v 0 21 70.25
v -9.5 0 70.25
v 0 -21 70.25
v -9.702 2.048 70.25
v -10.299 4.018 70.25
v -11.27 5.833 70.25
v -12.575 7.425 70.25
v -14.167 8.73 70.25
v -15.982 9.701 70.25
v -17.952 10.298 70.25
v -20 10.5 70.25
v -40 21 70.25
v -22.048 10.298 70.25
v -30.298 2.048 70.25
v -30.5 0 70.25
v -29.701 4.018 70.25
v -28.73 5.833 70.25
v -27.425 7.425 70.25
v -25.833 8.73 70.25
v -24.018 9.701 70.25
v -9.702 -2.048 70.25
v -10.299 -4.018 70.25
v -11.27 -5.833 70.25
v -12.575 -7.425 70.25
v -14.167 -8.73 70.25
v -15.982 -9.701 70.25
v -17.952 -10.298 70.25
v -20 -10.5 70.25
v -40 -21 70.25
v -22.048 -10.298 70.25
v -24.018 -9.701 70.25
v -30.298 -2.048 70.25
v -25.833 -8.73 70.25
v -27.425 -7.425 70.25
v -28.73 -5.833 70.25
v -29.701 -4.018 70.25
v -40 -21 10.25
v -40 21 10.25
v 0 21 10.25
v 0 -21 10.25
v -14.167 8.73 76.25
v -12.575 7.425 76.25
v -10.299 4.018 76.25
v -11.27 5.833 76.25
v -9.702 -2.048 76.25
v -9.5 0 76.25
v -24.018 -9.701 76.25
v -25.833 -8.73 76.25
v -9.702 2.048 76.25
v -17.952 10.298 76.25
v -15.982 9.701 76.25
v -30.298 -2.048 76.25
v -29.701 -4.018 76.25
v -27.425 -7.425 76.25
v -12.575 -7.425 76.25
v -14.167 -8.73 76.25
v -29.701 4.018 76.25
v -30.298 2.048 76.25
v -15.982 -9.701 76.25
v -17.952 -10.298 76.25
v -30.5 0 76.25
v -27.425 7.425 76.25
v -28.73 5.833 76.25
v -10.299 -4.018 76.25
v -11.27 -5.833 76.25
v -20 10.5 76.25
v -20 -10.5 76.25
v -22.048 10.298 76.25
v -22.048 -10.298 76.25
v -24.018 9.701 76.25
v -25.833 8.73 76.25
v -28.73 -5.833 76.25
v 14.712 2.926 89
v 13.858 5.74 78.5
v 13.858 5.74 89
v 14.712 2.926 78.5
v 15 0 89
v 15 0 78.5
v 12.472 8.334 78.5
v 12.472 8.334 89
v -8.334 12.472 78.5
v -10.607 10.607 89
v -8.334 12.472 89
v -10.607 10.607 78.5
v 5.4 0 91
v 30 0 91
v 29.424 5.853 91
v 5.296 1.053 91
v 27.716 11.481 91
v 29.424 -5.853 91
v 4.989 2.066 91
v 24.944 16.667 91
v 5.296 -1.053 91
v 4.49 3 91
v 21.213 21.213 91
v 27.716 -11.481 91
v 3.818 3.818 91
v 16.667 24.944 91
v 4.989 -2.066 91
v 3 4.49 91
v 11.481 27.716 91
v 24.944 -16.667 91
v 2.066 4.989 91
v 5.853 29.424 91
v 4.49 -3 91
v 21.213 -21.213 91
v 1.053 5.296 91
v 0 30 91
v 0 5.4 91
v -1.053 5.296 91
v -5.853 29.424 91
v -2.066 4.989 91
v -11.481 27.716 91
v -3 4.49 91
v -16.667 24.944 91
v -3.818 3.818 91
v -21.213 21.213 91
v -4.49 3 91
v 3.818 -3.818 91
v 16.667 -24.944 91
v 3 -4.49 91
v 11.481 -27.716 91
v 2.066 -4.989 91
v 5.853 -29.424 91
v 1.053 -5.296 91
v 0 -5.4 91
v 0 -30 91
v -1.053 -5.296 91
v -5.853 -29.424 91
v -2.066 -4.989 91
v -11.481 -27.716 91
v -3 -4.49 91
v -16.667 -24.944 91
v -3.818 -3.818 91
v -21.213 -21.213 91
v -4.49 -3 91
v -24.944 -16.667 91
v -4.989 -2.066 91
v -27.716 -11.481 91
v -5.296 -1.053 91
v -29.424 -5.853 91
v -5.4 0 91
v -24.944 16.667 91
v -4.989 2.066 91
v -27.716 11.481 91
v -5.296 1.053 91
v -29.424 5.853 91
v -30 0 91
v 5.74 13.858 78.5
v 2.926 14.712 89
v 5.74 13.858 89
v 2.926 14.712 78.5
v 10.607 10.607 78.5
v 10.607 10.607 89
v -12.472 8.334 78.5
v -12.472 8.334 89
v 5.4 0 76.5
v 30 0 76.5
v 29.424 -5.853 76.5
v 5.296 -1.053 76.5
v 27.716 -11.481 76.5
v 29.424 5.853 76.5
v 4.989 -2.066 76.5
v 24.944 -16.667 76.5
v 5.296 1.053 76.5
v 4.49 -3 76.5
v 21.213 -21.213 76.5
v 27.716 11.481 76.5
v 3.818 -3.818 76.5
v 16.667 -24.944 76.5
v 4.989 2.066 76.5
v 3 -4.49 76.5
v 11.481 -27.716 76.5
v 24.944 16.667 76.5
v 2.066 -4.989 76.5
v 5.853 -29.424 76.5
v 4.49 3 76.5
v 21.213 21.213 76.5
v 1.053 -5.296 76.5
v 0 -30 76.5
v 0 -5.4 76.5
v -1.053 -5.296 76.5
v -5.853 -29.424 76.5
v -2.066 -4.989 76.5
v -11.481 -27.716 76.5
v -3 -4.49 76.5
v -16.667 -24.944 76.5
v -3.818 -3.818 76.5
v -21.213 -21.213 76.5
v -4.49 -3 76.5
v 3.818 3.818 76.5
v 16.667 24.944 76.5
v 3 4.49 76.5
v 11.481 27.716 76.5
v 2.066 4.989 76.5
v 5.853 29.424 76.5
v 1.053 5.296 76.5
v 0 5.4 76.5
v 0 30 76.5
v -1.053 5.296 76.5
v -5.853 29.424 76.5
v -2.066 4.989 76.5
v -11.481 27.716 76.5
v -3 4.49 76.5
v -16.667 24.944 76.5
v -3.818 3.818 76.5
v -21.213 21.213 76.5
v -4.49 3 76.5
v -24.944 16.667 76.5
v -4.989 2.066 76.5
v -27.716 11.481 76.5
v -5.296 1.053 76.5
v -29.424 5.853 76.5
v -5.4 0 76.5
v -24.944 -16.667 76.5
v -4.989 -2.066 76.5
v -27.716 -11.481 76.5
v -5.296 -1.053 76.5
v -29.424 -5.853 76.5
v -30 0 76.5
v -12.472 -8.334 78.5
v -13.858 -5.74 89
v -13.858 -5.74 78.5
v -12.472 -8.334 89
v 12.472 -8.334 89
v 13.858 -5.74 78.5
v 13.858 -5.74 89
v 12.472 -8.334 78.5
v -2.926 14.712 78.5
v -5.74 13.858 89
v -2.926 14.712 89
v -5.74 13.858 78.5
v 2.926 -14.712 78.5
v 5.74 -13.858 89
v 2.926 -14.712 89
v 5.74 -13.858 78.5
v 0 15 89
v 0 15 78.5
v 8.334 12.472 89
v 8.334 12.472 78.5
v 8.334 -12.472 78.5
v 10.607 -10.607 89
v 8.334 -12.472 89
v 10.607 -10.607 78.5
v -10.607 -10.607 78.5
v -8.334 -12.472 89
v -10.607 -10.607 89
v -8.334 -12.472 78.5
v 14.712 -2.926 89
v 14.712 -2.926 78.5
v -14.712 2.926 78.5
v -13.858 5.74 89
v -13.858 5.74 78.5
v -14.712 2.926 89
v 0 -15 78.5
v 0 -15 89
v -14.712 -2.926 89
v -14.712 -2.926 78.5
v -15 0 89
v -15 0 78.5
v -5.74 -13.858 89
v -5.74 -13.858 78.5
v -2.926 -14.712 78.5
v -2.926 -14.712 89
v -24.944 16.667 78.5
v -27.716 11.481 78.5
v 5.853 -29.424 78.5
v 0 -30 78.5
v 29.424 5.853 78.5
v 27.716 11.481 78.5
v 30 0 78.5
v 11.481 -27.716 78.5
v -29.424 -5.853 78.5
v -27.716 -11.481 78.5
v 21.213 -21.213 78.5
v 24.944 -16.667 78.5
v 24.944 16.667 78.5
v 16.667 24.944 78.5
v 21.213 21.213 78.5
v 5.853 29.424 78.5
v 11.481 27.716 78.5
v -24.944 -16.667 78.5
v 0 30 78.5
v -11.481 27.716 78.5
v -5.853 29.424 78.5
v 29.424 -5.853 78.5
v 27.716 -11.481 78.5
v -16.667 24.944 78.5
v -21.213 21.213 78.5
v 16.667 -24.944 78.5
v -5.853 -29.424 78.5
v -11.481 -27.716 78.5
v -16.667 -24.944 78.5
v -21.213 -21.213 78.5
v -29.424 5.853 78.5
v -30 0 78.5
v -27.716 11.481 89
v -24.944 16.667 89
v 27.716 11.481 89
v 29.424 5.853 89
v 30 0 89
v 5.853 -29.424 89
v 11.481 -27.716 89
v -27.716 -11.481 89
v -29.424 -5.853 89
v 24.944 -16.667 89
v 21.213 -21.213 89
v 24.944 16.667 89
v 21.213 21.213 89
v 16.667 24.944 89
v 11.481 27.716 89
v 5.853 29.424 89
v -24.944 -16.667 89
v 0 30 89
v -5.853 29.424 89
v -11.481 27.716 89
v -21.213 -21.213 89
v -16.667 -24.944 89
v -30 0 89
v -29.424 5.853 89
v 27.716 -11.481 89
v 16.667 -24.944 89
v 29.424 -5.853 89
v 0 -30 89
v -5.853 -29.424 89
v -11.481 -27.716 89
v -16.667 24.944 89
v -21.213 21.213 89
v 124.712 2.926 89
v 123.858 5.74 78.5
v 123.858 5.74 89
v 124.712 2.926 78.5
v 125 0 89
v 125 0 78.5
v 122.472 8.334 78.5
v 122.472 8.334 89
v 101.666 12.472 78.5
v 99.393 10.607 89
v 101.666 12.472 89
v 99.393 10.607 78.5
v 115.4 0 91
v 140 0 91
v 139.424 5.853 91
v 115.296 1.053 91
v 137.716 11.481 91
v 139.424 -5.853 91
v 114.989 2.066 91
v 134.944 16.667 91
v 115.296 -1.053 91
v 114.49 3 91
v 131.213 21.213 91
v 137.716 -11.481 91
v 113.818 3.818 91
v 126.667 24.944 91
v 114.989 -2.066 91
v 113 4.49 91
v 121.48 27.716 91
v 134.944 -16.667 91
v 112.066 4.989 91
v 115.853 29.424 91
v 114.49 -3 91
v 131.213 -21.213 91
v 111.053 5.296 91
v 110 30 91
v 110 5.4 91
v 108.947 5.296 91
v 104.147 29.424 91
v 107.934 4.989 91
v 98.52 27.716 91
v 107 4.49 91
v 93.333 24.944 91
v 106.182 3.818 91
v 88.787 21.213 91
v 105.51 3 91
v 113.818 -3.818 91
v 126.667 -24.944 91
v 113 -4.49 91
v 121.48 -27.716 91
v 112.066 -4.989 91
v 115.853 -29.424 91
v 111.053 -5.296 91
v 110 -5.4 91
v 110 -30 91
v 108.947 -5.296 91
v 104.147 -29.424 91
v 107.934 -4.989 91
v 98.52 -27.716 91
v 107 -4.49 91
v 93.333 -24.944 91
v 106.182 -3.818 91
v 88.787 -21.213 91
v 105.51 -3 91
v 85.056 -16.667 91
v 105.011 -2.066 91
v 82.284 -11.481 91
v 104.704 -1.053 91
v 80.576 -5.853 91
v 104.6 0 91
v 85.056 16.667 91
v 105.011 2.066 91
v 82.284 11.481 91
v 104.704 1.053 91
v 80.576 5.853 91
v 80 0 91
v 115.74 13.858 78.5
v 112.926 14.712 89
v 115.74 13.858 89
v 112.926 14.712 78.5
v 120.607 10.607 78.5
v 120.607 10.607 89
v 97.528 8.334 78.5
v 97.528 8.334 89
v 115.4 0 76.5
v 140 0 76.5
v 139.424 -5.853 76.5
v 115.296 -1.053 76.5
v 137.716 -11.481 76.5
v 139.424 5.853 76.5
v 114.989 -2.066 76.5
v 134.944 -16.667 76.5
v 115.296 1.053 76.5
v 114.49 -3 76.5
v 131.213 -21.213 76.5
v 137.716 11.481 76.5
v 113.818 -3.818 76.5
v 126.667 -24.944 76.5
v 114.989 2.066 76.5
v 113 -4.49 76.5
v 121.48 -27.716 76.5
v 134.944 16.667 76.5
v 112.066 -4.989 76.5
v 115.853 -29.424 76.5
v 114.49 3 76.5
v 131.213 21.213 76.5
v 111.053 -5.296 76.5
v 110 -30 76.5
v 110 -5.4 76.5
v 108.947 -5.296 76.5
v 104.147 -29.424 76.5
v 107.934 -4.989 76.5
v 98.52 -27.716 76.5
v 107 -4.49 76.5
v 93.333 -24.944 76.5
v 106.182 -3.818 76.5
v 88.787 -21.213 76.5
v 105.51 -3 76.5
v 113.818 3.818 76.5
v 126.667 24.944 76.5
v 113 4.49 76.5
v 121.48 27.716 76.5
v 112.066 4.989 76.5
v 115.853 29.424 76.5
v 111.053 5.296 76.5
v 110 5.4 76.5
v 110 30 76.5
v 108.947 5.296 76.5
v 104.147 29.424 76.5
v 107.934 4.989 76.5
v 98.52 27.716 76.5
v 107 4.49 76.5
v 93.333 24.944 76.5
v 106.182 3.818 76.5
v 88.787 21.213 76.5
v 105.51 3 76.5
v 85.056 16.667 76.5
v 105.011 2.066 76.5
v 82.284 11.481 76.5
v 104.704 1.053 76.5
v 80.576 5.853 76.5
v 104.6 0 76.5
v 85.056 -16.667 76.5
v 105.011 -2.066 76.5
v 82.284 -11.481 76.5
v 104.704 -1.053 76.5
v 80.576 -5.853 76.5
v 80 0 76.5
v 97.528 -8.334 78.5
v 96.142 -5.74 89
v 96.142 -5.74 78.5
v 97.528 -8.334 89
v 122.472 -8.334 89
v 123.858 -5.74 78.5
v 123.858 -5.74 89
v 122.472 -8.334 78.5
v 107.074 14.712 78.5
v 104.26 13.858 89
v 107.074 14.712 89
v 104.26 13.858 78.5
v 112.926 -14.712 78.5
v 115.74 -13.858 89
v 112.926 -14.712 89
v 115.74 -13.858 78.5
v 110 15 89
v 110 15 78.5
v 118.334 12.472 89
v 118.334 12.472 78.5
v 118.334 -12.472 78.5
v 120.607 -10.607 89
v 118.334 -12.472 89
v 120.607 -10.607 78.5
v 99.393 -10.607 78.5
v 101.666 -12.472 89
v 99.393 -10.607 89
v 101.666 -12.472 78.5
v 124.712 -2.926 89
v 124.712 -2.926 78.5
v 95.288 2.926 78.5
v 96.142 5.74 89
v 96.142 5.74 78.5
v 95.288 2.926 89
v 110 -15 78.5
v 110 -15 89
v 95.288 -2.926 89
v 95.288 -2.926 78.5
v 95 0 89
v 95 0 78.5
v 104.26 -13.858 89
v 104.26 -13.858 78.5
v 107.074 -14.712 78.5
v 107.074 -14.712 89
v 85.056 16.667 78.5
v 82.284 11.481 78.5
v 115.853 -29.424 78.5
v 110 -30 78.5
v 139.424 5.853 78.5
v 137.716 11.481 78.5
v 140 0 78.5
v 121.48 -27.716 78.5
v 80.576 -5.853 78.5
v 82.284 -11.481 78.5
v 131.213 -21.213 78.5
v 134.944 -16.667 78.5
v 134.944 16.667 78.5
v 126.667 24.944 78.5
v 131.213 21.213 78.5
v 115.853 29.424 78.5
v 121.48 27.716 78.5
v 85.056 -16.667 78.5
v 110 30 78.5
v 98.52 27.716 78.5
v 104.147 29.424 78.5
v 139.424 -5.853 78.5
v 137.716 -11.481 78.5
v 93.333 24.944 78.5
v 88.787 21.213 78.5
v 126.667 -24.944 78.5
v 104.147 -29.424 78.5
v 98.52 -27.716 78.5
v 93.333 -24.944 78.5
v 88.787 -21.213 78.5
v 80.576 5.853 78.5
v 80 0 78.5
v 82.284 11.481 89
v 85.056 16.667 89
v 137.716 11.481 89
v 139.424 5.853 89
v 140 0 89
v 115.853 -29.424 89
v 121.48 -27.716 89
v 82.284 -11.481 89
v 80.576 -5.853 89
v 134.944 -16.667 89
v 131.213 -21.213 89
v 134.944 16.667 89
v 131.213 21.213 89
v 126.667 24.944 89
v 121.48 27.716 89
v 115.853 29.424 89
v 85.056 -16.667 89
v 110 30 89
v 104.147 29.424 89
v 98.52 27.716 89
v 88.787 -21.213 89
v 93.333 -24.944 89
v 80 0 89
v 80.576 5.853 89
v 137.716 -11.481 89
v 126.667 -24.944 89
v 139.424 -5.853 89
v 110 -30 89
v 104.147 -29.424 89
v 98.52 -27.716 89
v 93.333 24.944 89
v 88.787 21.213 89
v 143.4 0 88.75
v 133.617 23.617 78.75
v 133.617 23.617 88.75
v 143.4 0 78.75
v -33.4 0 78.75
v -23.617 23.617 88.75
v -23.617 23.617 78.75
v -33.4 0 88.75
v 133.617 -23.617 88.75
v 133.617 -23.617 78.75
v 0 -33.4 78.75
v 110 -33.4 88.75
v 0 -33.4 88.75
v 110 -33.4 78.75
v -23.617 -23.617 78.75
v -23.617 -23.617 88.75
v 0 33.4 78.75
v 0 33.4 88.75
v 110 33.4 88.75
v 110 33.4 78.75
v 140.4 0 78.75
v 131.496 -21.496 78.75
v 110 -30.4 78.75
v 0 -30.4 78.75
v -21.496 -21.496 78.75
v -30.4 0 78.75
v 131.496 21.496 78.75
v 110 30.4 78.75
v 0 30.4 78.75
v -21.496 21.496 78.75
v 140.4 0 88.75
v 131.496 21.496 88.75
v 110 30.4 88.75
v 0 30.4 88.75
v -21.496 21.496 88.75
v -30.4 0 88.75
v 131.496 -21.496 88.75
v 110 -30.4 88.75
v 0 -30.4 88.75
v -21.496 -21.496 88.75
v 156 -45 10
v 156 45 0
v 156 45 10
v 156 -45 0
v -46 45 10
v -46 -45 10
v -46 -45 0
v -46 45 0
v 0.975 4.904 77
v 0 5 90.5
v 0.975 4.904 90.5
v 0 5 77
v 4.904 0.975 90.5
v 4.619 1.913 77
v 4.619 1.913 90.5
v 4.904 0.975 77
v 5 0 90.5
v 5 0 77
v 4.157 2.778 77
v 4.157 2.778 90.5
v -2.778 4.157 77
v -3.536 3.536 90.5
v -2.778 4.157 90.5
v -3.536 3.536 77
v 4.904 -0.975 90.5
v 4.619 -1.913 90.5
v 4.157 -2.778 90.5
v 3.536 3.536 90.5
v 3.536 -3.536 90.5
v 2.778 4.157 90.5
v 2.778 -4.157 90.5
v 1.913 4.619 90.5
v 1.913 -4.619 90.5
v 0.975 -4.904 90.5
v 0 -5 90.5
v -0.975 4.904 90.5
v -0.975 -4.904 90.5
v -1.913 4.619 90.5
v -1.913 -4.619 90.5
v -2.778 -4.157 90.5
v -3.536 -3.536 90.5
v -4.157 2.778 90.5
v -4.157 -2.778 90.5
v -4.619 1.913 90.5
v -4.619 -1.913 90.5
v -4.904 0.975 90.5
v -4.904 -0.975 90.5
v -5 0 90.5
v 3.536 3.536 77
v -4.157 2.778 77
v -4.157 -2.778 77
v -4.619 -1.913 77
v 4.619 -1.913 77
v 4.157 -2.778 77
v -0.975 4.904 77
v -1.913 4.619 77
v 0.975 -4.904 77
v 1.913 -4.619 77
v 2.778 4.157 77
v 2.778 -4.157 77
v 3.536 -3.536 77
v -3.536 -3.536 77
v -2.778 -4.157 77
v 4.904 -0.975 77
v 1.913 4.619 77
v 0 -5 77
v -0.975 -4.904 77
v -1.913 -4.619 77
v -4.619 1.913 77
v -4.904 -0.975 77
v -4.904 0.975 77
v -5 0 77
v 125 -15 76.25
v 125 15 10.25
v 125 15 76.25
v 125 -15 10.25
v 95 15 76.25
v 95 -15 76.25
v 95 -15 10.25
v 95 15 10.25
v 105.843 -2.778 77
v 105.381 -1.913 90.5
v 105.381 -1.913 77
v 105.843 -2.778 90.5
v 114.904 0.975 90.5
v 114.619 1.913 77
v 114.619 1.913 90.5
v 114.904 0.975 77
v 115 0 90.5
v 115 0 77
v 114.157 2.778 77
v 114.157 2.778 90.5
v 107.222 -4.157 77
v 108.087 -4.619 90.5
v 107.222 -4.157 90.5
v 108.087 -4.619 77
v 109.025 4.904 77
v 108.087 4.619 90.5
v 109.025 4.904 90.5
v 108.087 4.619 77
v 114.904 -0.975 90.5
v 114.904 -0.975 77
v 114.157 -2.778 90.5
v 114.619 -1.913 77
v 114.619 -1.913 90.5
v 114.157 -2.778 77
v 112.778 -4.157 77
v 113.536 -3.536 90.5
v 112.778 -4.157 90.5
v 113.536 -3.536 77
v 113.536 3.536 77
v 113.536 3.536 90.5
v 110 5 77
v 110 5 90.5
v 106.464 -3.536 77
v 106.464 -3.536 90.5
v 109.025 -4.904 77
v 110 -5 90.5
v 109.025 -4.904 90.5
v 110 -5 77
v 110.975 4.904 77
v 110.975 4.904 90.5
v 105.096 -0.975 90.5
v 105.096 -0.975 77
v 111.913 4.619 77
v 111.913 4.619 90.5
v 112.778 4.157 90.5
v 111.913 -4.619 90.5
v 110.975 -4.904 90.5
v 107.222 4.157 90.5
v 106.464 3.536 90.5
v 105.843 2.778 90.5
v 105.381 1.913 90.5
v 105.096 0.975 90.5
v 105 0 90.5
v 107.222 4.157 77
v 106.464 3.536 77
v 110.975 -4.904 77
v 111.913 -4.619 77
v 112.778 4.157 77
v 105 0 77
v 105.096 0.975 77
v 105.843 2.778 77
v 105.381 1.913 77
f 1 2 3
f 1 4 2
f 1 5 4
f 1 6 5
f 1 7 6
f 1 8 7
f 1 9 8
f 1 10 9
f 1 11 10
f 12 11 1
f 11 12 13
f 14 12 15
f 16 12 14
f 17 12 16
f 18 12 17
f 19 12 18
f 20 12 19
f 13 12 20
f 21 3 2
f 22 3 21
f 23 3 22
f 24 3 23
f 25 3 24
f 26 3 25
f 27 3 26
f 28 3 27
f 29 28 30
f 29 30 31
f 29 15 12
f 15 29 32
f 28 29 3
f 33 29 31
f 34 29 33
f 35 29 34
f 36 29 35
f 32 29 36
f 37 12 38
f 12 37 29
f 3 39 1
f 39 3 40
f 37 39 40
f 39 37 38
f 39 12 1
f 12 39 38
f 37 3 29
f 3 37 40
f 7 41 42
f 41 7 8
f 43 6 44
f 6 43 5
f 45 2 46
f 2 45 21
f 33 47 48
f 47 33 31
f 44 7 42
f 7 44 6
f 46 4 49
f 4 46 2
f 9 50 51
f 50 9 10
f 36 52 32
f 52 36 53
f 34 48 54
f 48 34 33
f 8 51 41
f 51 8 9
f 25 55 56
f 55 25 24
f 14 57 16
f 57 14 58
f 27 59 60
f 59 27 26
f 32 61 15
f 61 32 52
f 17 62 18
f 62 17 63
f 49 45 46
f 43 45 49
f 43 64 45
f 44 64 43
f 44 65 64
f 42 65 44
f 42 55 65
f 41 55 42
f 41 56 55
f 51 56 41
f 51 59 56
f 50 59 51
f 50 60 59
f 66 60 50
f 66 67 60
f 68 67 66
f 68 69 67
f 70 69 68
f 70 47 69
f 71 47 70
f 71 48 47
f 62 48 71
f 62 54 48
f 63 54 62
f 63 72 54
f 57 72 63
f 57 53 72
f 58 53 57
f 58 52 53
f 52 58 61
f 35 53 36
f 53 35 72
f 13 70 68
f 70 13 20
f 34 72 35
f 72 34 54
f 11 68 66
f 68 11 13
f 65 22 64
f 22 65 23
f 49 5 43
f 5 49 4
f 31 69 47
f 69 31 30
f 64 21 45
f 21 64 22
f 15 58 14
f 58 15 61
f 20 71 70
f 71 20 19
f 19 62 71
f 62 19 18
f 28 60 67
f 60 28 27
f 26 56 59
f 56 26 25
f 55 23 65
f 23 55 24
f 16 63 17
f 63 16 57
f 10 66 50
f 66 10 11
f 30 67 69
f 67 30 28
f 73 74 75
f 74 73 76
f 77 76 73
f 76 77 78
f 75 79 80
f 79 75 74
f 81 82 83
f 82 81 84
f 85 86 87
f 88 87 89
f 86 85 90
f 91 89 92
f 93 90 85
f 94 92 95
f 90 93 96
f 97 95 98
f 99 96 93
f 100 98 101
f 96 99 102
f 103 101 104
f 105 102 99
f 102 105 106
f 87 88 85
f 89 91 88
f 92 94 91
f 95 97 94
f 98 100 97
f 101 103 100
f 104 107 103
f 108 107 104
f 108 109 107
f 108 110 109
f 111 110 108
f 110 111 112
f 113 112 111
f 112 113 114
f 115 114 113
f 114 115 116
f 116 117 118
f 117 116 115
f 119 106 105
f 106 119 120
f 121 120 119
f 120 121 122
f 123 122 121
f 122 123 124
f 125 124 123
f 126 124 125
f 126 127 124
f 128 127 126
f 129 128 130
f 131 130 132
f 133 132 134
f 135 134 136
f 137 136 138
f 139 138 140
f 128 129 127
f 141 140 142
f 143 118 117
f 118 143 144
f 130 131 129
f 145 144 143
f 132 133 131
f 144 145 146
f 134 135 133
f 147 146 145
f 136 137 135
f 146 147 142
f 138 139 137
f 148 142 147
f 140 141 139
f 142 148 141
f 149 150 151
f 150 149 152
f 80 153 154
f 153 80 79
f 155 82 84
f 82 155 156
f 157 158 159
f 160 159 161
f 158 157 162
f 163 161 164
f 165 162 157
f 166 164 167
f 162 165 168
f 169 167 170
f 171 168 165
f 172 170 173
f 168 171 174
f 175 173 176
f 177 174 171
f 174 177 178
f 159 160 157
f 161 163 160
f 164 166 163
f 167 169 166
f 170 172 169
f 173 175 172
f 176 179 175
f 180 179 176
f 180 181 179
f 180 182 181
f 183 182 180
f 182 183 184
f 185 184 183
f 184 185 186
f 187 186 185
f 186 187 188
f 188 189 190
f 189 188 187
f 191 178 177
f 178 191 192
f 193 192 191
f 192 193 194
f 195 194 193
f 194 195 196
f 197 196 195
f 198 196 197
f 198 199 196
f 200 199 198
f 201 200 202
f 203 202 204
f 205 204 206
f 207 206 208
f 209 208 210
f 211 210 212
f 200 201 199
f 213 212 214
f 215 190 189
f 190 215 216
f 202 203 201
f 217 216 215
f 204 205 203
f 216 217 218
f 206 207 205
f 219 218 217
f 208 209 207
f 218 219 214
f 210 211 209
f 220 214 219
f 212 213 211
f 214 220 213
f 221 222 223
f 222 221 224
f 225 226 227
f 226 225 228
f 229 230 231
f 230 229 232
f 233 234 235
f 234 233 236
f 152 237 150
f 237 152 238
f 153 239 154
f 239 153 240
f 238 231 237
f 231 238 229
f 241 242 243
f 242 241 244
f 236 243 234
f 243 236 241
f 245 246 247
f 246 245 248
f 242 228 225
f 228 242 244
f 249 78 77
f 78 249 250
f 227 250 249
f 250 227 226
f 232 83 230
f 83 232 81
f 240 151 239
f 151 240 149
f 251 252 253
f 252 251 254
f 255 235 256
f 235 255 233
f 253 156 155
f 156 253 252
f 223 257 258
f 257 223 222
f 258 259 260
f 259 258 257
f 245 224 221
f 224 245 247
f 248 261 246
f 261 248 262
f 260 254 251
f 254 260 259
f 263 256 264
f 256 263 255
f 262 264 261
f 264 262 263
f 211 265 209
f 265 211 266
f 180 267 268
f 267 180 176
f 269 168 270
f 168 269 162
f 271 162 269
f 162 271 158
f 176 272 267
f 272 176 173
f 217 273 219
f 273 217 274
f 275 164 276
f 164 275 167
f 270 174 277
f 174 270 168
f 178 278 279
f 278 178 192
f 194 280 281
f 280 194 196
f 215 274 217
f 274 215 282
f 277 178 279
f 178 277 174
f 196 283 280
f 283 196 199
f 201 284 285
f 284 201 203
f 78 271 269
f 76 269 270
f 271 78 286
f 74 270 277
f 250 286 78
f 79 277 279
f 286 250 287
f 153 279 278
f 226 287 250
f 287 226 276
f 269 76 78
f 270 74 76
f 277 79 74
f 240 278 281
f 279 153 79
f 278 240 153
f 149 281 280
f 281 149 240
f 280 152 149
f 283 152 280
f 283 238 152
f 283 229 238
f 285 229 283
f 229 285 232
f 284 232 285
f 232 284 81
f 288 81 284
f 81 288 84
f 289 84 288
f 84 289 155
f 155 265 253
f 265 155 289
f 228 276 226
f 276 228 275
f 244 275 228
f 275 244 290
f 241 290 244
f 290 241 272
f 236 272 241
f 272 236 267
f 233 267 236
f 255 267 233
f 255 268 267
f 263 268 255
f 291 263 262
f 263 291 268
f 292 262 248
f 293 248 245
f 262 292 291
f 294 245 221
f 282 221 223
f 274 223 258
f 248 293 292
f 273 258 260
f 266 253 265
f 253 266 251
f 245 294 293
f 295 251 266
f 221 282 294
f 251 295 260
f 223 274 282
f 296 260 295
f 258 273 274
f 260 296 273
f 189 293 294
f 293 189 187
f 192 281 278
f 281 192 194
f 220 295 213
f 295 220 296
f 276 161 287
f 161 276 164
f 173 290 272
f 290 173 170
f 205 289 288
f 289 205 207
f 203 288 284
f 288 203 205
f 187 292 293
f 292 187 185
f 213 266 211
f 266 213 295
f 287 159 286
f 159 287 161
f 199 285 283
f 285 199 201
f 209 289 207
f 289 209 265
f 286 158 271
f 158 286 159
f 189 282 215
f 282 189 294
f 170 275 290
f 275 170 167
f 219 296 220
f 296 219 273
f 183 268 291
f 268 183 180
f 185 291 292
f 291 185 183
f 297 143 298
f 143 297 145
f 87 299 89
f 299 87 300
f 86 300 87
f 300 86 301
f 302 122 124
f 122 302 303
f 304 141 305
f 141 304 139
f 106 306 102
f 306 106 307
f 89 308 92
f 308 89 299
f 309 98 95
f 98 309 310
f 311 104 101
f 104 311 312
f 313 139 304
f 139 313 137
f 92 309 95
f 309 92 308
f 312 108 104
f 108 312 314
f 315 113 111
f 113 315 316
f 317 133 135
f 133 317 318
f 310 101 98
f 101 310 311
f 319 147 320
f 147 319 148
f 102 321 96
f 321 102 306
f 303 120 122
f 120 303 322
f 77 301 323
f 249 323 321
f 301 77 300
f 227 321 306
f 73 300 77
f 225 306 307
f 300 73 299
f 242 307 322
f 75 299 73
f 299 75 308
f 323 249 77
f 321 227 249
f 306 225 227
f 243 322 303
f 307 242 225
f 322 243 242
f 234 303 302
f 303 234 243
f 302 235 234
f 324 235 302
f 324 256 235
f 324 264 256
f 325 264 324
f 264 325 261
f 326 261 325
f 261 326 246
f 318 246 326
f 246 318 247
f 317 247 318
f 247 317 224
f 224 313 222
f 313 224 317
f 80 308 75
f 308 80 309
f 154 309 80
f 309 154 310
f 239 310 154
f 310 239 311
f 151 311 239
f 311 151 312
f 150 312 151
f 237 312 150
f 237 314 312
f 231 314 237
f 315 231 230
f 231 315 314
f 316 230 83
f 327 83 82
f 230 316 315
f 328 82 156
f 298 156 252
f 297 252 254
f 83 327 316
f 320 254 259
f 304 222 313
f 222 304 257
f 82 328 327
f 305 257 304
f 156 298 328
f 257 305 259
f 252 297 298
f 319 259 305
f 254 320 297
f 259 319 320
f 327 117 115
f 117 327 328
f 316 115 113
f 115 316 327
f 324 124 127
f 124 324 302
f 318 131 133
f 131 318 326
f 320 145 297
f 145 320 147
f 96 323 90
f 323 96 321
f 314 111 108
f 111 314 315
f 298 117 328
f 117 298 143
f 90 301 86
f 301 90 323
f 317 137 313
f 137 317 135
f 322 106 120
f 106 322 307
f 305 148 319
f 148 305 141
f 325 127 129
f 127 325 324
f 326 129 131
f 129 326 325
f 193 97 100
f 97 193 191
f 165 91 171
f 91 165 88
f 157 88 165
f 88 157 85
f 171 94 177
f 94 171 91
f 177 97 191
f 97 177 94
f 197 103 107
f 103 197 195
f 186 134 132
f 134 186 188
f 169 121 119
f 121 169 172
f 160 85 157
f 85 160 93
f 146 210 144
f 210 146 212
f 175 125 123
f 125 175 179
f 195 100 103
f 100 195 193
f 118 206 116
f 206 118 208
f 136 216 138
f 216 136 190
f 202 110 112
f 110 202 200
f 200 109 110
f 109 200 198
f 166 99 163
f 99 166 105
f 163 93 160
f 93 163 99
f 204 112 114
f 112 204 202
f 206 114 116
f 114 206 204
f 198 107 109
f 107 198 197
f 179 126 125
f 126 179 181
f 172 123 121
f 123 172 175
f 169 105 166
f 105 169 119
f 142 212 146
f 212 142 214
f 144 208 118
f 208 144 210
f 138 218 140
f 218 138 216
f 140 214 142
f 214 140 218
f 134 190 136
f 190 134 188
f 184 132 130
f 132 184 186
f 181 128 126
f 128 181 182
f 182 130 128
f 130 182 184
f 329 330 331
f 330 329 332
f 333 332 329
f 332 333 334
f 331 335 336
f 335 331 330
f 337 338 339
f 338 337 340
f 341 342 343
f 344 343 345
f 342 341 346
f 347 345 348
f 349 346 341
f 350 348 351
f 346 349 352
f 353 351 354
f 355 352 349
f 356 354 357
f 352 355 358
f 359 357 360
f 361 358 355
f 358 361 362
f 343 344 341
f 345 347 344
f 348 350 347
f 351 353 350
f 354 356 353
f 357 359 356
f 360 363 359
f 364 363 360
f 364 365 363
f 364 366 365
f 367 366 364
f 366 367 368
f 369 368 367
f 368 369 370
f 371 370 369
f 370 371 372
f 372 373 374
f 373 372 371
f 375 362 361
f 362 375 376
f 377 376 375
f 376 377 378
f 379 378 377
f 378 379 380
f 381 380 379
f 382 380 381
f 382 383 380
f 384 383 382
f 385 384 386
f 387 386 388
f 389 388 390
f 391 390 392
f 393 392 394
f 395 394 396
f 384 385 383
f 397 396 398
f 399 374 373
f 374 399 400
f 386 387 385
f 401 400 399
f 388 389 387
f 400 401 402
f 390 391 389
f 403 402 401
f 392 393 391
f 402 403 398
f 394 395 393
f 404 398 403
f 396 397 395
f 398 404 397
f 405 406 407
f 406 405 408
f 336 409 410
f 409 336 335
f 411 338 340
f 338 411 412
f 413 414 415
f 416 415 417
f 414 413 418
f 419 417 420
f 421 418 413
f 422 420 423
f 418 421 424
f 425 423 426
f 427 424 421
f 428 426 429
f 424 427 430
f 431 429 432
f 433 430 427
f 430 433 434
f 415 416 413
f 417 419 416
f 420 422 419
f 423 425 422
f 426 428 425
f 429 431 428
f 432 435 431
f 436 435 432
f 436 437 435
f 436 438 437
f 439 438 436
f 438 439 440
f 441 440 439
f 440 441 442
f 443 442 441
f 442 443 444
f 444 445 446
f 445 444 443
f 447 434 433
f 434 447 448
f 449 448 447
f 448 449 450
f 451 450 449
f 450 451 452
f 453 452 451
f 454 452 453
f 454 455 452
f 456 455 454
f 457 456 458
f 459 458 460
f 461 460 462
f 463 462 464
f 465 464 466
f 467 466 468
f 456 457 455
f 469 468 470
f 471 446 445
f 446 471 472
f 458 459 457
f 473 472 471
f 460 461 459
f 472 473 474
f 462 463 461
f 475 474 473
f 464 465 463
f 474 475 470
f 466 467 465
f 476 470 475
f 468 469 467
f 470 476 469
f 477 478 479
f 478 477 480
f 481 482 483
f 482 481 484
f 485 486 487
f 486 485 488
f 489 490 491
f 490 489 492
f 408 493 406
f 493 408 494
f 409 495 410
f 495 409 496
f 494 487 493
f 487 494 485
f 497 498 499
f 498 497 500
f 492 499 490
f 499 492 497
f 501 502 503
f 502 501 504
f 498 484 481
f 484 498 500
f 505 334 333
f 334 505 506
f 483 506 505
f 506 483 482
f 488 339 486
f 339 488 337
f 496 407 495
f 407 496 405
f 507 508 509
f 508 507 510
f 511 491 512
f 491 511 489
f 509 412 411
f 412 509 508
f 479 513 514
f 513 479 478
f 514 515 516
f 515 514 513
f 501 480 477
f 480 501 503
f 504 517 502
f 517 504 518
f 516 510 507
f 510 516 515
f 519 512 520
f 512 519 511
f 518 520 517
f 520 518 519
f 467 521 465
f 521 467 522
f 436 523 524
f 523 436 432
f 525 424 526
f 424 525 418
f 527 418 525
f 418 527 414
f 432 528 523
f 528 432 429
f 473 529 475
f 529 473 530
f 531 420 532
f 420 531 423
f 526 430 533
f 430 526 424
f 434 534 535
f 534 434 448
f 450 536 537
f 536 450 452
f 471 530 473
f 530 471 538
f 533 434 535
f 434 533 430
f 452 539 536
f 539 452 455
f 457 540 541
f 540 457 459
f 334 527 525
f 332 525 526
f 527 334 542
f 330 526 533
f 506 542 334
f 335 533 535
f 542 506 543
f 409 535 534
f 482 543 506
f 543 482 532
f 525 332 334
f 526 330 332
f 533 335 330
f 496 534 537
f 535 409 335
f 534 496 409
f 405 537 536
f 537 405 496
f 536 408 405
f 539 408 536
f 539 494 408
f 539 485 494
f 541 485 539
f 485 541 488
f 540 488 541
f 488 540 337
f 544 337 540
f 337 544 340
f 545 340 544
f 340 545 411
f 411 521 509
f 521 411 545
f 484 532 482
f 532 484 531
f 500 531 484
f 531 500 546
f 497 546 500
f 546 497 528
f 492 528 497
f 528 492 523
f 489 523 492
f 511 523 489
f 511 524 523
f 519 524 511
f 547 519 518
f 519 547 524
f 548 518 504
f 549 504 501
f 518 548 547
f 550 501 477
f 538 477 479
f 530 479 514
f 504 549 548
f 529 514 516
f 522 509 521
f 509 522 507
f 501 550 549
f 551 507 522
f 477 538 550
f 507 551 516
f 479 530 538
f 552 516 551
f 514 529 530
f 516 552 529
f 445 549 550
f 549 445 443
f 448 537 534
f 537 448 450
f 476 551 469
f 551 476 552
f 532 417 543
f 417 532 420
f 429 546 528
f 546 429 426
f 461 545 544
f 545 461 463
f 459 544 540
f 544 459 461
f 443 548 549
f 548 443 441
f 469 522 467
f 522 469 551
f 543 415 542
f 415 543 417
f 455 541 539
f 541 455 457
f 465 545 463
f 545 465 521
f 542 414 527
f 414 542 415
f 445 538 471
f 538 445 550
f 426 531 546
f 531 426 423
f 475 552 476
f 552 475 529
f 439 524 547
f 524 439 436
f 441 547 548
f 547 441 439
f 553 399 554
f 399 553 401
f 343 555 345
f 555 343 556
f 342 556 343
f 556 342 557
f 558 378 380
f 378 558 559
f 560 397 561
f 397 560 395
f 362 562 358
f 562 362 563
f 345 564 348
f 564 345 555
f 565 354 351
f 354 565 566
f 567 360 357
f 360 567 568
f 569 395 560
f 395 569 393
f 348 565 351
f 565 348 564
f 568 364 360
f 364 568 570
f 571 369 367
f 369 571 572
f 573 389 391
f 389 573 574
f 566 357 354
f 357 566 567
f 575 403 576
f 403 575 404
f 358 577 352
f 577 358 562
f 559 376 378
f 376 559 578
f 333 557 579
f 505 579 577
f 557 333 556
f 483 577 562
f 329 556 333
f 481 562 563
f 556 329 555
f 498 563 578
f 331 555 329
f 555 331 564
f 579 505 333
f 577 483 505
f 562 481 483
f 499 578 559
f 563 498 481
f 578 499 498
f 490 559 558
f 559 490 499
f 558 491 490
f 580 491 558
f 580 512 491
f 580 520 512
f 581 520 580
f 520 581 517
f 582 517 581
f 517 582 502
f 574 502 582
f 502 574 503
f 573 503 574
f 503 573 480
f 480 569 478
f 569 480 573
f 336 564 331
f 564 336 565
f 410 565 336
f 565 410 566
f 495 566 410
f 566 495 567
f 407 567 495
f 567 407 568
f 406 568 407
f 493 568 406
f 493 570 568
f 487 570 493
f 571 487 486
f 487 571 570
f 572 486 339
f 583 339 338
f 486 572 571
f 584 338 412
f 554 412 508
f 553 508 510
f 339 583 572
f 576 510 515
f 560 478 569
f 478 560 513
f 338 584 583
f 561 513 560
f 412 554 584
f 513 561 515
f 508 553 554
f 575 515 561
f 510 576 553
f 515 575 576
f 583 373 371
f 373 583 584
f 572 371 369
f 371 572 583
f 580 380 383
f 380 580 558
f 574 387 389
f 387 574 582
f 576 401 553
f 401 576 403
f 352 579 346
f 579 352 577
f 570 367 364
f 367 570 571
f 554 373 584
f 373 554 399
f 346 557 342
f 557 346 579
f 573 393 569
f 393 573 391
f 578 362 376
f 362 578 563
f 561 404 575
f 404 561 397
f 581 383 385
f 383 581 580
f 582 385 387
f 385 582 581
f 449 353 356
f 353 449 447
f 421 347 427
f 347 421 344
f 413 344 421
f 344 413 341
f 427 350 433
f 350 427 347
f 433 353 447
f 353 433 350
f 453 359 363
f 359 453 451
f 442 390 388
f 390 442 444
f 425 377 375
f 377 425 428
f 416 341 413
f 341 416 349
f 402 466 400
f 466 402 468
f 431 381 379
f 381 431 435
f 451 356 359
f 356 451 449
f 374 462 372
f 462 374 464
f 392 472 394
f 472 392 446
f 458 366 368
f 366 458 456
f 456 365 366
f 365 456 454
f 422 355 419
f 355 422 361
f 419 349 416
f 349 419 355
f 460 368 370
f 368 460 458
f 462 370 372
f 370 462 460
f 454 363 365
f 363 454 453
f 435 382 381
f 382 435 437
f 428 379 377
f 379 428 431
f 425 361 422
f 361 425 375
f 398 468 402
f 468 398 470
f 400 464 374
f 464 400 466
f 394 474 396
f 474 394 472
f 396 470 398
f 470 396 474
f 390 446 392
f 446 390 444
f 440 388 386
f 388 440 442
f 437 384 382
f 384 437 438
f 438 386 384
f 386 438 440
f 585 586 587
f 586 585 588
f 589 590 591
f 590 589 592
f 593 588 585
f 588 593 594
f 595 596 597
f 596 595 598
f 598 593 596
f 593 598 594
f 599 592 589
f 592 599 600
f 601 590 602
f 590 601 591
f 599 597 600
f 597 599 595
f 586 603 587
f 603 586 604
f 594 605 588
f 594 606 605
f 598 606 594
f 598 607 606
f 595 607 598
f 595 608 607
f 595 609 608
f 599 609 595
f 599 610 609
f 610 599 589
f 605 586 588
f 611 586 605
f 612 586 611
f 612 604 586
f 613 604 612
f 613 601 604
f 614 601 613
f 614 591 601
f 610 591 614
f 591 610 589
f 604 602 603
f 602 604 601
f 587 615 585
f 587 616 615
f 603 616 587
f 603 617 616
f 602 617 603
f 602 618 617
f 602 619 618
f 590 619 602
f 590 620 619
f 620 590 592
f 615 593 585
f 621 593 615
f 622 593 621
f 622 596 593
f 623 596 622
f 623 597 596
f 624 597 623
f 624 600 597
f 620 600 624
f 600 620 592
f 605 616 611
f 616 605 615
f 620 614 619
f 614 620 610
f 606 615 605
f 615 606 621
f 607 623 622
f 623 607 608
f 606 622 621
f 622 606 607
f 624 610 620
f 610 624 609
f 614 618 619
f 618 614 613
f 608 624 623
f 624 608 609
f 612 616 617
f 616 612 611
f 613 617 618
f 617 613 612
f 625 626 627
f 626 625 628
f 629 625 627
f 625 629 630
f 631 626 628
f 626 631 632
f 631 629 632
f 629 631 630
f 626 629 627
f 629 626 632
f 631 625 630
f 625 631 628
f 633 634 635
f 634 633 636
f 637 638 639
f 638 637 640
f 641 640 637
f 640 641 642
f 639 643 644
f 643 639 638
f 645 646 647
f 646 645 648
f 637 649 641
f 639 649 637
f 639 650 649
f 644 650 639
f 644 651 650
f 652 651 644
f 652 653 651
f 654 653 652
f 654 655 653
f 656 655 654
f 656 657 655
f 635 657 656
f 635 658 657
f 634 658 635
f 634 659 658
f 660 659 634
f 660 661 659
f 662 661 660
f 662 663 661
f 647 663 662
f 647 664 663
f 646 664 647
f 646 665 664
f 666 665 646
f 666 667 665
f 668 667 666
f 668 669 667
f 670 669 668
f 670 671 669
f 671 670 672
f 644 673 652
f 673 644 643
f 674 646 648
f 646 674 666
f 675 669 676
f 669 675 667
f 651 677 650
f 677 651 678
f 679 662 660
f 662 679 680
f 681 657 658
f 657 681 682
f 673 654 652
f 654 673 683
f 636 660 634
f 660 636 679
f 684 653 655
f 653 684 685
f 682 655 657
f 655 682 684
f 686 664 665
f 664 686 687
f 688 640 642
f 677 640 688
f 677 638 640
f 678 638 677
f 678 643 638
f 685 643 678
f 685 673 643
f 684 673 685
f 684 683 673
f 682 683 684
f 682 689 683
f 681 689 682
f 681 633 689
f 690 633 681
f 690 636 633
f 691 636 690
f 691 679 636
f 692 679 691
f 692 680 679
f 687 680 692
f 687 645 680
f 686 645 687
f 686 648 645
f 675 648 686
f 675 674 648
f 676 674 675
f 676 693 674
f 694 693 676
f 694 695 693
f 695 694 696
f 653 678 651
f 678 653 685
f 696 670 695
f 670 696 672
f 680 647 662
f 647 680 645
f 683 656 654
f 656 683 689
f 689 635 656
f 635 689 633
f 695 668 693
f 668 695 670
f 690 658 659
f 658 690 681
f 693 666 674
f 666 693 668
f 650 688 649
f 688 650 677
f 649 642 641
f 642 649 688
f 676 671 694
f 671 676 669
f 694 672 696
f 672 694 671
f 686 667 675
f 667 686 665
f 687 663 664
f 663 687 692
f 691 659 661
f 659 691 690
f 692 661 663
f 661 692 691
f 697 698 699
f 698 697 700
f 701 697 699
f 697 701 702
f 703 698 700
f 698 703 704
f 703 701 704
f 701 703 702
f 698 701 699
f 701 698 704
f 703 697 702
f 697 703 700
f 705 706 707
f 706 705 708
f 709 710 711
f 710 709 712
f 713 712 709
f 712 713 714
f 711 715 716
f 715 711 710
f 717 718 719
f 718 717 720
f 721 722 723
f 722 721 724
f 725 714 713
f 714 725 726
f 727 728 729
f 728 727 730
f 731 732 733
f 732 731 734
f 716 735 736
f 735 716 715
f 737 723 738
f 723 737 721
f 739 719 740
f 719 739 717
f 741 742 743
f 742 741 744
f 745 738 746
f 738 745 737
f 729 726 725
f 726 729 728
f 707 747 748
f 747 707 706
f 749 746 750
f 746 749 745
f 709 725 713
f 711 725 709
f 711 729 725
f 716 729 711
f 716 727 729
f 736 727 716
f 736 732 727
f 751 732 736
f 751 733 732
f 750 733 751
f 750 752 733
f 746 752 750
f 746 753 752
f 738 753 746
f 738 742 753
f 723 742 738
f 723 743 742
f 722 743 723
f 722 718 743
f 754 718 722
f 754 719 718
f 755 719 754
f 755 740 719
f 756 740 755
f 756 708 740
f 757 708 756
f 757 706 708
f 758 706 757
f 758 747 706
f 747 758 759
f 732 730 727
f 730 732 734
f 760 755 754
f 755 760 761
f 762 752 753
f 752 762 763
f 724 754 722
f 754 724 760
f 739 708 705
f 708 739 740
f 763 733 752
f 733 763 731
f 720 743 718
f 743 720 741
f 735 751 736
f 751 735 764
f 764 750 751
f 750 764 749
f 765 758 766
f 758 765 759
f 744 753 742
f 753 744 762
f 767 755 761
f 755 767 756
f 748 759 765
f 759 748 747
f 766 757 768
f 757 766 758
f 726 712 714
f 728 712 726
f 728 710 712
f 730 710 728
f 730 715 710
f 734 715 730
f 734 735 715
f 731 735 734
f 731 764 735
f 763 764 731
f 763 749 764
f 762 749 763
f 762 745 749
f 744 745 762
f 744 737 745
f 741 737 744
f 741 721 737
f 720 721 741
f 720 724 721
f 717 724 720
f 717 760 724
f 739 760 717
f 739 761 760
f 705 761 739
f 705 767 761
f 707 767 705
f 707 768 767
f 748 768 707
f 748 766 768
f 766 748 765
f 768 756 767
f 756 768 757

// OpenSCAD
$fn = 32;

// ------------------------------------------------------------------------
// Motor belt drive: span 110 mm, pulleys d60, belt 10 mm wide
// Every part is its own module, assembly() places every instance.
// ------------------------------------------------------------------------

// --- part 1 ---
module base_plate() {
  difference() {
    translate([-101, -45, 0]) cube([202, 90, 10]);
  }
}

// --- part 2 ---
module motor() {
  union() {
    translate([-30, -21, 0]) cube([60, 42, 40]);
    translate([33, 0, 20]) rotate([0, 90, 0]) cylinder(h = 6, d = 21, center = true);
  }
}

// --- part 3 ---
module drive_shaft() {
  translate([0, 0, -6.75]) cylinder(h = 13.5, d = 10);
}

// --- part 4 ---
module pulley_drive() {
  difference() {
    union() {
      cylinder(h = 14.5, d = 30);
      cylinder(h = 2, d = 60);
      translate([0, 0, 12.5]) cylinder(h = 2, d = 60);
    }
    translate([0, 0, -1]) cylinder(h = 16.5, d = 10.8);
  }
}

// --- part 5 ---
module idler_post() {
  translate([-15, -15, 0]) cube([30, 30, 66]);
}

// --- part 6 ---
module driven_shaft() {
  translate([0, 0, -6.75]) cylinder(h = 13.5, d = 10);
}

// --- part 7 ---
module pulley_driven() {
  difference() {
    union() {
      cylinder(h = 14.5, d = 30);
      cylinder(h = 2, d = 60);
      translate([0, 0, 12.5]) cylinder(h = 2, d = 60);
    }
    translate([0, 0, -1]) cylinder(h = 16.5, d = 10.8);
  }
}

// --- part 8 ---
module drive_belt() {
  difference() {
    linear_extrude(height = 10) polygon(points = concat([for (a = [90 : 45 : 270]) [33.4 * cos(a), 33.4 * sin(a)]], [for (a = [270 : 45 : 450]) [110 + 33.4 * cos(a), 33.4 * sin(a)]]));
    translate([0, 0, -1]) linear_extrude(height = 12) polygon(points = concat([for (a = [90 : 45 : 270]) [30.4 * cos(a), 30.4 * sin(a)]], [for (a = [270 : 45 : 450]) [110 + 30.4 * cos(a), 30.4 * sin(a)]]));
  }
}

// --- assembly ---
module assembly() {
  color([0.80, 0.24, 0.20]) translate([55, 0, 0]) rotate([0, 0, 0]) base_plate();
  color([0.20, 0.45, 0.75]) translate([0, 0, 40.25]) rotate([0, 270, 0]) motor();
  color([0.25, 0.62, 0.32]) translate([0, 0, 83.75]) rotate([0, 0, 0]) drive_shaft();
  color([0.92, 0.70, 0.18]) translate([0, 0, 76.5]) rotate([0, 0, 0]) pulley_drive();
  color([0.58, 0.35, 0.70]) translate([110, 0, 10.25]) rotate([0, 0, 0]) idler_post();
  color([0.16, 0.66, 0.66]) translate([110, 0, 83.75]) rotate([0, 0, 0]) driven_shaft();
  color([0.85, 0.48, 0.18]) translate([110, 0, 76.5]) rotate([0, 0, 0]) pulley_driven();
  color([0.55, 0.60, 0.65]) translate([0, 0, 78.75]) rotate([0, 0, 0]) drive_belt();
}

assembly();
